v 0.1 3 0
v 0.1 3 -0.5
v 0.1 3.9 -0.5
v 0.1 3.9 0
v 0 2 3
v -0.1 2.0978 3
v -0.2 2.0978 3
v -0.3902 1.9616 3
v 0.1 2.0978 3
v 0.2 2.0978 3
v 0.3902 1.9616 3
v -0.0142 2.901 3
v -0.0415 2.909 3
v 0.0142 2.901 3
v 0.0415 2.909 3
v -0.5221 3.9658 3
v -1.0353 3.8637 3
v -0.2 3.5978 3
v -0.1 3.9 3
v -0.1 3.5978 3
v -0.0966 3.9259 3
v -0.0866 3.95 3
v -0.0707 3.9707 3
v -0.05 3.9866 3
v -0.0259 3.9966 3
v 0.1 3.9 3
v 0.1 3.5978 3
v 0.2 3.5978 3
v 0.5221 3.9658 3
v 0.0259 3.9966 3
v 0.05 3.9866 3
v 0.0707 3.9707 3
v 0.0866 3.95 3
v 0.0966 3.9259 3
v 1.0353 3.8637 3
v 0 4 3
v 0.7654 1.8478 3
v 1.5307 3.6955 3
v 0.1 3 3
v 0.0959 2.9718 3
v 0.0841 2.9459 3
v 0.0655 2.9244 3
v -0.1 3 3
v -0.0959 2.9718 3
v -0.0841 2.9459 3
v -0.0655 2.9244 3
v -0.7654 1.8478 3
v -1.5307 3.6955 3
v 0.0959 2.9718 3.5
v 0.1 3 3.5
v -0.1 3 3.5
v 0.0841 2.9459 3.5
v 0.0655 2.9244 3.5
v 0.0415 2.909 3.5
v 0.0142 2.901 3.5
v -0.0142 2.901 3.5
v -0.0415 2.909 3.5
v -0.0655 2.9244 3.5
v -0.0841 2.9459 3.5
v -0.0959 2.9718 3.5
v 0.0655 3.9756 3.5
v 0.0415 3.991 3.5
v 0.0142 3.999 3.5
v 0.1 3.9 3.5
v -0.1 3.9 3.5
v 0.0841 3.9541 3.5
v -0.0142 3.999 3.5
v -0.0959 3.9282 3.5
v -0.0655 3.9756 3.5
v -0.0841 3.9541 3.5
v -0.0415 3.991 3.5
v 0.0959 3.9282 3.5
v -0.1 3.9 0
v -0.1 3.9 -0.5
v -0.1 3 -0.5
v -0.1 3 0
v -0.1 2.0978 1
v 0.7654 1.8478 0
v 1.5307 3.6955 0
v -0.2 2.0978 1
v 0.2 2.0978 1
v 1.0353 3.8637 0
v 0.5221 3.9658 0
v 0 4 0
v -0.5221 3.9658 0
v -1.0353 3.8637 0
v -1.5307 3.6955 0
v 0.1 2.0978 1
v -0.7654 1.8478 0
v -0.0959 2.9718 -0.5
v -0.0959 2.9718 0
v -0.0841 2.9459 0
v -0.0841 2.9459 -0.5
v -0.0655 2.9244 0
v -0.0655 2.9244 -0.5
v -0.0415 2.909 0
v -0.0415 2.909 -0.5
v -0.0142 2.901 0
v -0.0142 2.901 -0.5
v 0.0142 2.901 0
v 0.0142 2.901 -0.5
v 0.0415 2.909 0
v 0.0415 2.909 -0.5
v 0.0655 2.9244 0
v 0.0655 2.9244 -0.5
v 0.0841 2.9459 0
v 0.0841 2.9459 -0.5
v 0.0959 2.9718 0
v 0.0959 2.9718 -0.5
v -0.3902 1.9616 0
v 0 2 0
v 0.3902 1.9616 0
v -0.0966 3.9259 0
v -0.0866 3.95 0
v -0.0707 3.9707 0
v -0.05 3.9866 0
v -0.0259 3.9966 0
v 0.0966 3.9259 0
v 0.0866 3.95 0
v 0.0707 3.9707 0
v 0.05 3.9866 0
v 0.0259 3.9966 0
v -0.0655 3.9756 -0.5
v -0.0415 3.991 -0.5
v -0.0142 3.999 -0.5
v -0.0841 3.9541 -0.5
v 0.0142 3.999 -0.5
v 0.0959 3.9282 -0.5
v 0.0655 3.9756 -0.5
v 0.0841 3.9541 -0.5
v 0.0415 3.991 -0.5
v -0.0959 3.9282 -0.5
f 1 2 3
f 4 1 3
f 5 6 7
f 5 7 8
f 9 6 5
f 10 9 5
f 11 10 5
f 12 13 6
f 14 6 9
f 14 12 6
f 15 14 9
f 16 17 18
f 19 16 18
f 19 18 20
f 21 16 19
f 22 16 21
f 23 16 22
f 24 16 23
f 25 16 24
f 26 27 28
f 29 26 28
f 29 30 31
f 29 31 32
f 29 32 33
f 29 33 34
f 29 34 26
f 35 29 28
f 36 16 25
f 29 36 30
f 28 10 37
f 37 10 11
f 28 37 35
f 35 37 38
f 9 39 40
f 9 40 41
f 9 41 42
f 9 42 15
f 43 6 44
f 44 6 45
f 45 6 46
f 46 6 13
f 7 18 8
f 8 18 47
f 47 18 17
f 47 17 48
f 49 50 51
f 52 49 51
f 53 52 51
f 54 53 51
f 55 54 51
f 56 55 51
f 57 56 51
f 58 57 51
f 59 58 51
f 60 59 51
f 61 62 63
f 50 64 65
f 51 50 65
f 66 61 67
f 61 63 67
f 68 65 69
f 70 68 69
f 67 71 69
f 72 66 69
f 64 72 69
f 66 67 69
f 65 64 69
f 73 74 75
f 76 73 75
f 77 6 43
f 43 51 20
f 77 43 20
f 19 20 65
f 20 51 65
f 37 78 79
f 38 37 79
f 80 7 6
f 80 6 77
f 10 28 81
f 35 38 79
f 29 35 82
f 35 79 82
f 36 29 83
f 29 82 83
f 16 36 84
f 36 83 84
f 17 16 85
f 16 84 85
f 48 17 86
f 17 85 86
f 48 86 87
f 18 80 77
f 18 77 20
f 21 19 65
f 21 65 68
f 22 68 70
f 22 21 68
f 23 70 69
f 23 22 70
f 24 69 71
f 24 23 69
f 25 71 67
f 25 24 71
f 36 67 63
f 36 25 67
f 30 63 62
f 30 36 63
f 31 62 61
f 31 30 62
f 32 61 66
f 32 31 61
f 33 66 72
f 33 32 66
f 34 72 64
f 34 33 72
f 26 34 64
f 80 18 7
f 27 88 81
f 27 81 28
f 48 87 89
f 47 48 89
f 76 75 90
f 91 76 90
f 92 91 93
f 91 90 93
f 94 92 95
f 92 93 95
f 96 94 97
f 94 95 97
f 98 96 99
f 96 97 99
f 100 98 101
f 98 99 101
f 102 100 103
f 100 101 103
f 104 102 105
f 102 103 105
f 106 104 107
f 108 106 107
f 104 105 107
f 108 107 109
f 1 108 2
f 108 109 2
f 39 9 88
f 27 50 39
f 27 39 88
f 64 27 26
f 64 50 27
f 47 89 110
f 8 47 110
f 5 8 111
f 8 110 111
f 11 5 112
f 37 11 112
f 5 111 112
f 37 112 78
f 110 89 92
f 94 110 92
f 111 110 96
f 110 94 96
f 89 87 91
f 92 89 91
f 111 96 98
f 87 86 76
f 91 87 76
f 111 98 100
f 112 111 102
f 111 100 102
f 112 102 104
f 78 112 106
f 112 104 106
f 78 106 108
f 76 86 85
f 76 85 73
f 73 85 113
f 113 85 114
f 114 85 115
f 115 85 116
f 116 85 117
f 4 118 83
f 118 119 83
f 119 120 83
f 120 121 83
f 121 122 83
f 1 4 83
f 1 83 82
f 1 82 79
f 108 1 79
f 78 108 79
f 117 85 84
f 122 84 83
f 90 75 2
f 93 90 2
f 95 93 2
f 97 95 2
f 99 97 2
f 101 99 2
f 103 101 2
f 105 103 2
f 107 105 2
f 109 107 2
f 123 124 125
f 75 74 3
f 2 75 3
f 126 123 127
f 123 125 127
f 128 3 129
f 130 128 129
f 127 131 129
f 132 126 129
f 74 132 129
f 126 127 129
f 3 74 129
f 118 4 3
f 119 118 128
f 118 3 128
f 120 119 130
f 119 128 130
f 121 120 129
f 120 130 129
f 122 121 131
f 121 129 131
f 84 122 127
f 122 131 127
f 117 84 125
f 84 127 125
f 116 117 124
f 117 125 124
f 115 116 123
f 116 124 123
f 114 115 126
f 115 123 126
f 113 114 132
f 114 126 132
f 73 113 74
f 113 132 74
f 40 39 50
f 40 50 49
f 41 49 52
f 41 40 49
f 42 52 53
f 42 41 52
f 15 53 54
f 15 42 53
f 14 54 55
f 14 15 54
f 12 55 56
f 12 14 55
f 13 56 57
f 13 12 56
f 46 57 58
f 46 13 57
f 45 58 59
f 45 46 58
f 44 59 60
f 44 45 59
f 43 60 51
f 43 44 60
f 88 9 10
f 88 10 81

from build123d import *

# Parameters (mm, degrees)
BOSS_EXTRUDE1_DEPTH     = 3
BOSS_EXTRUDE2_DEPTH     = 0.5
BOSS_EXTRUDE3_START     = 0.5
BOSS_EXTRUDE3_DEPTH     = 0.5
CUT_EXTRUDE2_DEPTH      = 0.1
CUT_EXTRUDE2_DEPTH_BACK = 0.3
SKETCH9_W               = 0.2
SKETCH9_H               = 1.5
BOSS_EXTRUDE5_DEPTH     = 3


with BuildPart() as part:
    # Sketch1 → Boss-Extrude1 (new body)
    with BuildSketch(Plane.XY):
        with BuildLine():
            Line((-1.530733729, 3.69551813), (-0.765366865, 1.847759065))
            ThreePointArc((-0.765366865, 1.847759065), (0, 2), (0.765366865, 1.847759065))
            Line((0.765366865, 1.847759065), (1.530733729, 3.69551813))
            ThreePointArc((1.530733729, 3.69551813), (0, 4), (-1.530733729, 3.69551813))
        make_face()
    extrude(amount=BOSS_EXTRUDE1_DEPTH)

    # Sketch2 → Boss-Extrude2 (add)
    with BuildSketch(Plane.XY.offset(3)):
        with BuildLine():
            Line((-0.1, 3), (-0.1, 3.9))
            ThreePointArc((-0.1, 3.9), (0, 4), (0.1, 3.9))
            Line((0.1, 3.9), (0.1, 3))
            ThreePointArc((0.1, 3), (0, 2.9), (-0.1, 3))
        make_face()
    extrude(amount=BOSS_EXTRUDE2_DEPTH)

    # Sketch3 → Boss-Extrude3 (add)
    with BuildSketch(Plane(origin=(0, 0, 0), x_dir=(-1, 0, 0), z_dir=(0, 0, -1)).offset(BOSS_EXTRUDE3_START)):
        with BuildLine():
            Line((-0.1, 3), (-0.1, 3.9))
            ThreePointArc((-0.1, 3.9), (0, 4), (0.1, 3.9))
            Line((0.1, 3.9), (0.1, 3))
            ThreePointArc((0.1, 3), (0, 2.9), (-0.1, 3))
        make_face()
    extrude(amount=-BOSS_EXTRUDE3_DEPTH)

    # Sketch5 → Cut-Extrude2 (cut, two sides: drawn at the far end of the back side and taken through both)
    with BuildSketch(Plane(origin=(0.1, 0, 0), x_dir=(0, 0, -1), z_dir=(1, 0, 0)).offset(-CUT_EXTRUDE2_DEPTH_BACK)):
        Polygon((-3, 3.597759065), (-3, 2.097759065), (-1, 2.097759065), align=None)
    extrude(amount=CUT_EXTRUDE2_DEPTH + CUT_EXTRUDE2_DEPTH_BACK, mode=Mode.SUBTRACT)

    # Sketch9 → Boss-Extrude5 (add)
    with BuildSketch(Plane.XY.offset(3)):
        with Locations((0, 2.847759065)):
            Rectangle(SKETCH9_W, SKETCH9_H)
    extrude(amount=-BOSS_EXTRUDE5_DEPTH)


solid = part.part
